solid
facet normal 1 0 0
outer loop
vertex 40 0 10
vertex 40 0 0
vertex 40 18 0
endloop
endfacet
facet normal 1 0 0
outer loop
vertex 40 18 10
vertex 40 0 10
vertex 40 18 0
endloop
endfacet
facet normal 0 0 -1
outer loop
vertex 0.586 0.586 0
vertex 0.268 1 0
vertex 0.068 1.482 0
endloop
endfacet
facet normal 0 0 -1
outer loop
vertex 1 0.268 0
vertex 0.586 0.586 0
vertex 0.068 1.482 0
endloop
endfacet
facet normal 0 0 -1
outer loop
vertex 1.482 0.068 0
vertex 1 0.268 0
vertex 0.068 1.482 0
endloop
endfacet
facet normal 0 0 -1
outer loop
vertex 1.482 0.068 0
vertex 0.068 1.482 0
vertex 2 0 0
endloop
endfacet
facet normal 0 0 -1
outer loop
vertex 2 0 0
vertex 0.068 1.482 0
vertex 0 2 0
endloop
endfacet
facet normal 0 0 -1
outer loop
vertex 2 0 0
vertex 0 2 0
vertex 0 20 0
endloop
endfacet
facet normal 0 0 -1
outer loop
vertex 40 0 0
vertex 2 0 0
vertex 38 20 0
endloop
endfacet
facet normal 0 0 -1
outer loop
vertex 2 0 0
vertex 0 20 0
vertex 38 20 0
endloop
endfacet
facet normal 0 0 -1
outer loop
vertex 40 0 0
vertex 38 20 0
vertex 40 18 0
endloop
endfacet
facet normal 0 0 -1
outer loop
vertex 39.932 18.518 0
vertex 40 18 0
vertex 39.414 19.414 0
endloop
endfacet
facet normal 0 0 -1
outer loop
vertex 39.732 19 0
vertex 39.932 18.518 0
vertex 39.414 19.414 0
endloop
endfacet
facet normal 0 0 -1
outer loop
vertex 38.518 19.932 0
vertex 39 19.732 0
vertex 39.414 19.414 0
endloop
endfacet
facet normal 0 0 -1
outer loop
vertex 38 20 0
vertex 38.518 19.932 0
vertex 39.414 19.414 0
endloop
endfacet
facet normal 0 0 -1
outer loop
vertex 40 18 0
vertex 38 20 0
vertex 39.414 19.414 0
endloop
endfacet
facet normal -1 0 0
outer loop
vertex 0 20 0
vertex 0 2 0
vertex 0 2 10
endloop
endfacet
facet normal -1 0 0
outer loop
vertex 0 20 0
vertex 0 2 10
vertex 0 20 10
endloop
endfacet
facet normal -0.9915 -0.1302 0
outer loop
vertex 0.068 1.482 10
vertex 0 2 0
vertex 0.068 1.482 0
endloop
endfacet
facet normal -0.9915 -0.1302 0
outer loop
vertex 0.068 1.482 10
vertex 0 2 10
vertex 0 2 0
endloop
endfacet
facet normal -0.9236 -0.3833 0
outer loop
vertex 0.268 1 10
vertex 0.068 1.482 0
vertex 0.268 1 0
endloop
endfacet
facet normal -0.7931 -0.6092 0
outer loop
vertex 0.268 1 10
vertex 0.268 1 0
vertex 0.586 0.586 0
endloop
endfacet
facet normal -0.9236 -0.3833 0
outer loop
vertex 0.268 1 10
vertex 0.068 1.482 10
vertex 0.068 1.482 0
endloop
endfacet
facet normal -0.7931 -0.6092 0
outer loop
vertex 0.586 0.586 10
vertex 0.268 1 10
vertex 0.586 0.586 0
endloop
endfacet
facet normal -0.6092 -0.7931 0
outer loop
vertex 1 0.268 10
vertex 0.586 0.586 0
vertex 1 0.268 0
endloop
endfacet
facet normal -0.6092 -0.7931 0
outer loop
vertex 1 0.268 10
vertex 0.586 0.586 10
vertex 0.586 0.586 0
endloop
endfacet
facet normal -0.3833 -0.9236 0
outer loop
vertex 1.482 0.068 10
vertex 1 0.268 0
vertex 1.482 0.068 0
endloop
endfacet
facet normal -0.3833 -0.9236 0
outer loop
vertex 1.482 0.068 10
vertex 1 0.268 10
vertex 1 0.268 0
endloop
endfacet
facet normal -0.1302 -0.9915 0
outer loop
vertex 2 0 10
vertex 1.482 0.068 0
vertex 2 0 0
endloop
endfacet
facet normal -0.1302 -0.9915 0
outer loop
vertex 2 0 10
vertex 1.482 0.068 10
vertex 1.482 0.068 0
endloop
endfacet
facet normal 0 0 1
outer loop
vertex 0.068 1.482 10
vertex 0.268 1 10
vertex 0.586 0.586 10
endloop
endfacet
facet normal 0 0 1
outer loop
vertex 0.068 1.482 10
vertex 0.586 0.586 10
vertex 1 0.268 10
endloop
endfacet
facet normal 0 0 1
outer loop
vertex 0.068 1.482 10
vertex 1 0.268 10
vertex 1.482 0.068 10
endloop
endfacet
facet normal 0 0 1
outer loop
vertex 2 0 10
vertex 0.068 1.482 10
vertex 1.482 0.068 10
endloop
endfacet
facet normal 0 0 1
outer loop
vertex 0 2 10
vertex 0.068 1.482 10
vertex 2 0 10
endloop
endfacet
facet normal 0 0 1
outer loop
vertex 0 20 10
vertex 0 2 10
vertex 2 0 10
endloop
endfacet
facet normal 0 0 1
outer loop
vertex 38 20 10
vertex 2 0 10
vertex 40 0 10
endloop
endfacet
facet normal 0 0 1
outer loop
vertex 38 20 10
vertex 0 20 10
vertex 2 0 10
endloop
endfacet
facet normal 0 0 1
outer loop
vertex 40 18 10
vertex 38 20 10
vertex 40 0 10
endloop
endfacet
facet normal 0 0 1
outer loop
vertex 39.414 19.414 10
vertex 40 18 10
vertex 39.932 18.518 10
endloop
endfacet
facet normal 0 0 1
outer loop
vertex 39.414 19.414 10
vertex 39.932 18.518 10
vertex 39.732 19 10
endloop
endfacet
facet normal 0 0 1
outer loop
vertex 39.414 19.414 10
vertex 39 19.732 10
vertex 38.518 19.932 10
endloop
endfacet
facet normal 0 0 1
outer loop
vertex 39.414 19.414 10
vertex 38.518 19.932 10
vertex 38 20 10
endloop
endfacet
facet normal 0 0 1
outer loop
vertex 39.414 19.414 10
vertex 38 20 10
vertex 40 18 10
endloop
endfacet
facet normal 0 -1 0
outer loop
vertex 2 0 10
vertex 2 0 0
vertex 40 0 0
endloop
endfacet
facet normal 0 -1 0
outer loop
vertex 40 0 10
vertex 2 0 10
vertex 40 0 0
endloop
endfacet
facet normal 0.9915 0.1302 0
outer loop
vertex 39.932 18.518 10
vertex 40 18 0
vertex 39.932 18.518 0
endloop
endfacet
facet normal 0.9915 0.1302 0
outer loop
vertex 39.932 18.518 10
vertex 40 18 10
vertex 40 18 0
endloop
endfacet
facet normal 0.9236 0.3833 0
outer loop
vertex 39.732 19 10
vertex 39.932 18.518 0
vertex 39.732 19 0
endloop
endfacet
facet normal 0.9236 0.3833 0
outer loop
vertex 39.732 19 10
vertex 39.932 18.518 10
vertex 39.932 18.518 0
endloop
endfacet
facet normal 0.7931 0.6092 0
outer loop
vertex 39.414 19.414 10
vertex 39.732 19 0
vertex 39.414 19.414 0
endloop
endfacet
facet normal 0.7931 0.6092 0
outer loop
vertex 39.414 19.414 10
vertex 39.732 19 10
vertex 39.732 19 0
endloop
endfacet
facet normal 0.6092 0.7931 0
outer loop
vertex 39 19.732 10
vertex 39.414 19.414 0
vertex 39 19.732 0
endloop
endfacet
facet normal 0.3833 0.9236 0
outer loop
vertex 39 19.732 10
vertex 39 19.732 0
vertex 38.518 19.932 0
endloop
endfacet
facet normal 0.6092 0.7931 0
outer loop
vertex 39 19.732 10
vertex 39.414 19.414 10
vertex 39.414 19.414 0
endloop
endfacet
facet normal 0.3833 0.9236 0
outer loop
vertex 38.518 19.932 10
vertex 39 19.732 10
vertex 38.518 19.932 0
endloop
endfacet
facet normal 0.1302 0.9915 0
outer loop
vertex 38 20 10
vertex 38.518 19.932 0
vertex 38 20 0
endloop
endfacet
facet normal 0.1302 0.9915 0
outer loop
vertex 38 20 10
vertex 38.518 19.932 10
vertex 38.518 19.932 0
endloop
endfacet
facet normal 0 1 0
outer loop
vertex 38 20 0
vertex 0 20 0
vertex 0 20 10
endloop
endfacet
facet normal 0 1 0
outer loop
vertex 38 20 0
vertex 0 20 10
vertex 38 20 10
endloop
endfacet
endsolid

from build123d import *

# Parameters (mm, degrees)
SKETCH1_W           = 40
SKETCH1_H           = 20
BOSS_EXTRUDE1_DEPTH = 10
FILLET1_R           = 2


with BuildPart() as part:
    # Sketch1 → Boss-Extrude1 (new body)
    with BuildSketch(Plane.XY):
        with Locations((20, 10)):
            Rectangle(SKETCH1_W, SKETCH1_H)
    extrude(amount=BOSS_EXTRUDE1_DEPTH)

    # Fillet1
    fillet1_edges = [part.edges().sort_by_distance(p)[0] for p in [
        (40, 20, 5),
        (0, 0, 5),
    ]]
    fillet(fillet1_edges, radius=FILLET1_R)


solid = part.part
